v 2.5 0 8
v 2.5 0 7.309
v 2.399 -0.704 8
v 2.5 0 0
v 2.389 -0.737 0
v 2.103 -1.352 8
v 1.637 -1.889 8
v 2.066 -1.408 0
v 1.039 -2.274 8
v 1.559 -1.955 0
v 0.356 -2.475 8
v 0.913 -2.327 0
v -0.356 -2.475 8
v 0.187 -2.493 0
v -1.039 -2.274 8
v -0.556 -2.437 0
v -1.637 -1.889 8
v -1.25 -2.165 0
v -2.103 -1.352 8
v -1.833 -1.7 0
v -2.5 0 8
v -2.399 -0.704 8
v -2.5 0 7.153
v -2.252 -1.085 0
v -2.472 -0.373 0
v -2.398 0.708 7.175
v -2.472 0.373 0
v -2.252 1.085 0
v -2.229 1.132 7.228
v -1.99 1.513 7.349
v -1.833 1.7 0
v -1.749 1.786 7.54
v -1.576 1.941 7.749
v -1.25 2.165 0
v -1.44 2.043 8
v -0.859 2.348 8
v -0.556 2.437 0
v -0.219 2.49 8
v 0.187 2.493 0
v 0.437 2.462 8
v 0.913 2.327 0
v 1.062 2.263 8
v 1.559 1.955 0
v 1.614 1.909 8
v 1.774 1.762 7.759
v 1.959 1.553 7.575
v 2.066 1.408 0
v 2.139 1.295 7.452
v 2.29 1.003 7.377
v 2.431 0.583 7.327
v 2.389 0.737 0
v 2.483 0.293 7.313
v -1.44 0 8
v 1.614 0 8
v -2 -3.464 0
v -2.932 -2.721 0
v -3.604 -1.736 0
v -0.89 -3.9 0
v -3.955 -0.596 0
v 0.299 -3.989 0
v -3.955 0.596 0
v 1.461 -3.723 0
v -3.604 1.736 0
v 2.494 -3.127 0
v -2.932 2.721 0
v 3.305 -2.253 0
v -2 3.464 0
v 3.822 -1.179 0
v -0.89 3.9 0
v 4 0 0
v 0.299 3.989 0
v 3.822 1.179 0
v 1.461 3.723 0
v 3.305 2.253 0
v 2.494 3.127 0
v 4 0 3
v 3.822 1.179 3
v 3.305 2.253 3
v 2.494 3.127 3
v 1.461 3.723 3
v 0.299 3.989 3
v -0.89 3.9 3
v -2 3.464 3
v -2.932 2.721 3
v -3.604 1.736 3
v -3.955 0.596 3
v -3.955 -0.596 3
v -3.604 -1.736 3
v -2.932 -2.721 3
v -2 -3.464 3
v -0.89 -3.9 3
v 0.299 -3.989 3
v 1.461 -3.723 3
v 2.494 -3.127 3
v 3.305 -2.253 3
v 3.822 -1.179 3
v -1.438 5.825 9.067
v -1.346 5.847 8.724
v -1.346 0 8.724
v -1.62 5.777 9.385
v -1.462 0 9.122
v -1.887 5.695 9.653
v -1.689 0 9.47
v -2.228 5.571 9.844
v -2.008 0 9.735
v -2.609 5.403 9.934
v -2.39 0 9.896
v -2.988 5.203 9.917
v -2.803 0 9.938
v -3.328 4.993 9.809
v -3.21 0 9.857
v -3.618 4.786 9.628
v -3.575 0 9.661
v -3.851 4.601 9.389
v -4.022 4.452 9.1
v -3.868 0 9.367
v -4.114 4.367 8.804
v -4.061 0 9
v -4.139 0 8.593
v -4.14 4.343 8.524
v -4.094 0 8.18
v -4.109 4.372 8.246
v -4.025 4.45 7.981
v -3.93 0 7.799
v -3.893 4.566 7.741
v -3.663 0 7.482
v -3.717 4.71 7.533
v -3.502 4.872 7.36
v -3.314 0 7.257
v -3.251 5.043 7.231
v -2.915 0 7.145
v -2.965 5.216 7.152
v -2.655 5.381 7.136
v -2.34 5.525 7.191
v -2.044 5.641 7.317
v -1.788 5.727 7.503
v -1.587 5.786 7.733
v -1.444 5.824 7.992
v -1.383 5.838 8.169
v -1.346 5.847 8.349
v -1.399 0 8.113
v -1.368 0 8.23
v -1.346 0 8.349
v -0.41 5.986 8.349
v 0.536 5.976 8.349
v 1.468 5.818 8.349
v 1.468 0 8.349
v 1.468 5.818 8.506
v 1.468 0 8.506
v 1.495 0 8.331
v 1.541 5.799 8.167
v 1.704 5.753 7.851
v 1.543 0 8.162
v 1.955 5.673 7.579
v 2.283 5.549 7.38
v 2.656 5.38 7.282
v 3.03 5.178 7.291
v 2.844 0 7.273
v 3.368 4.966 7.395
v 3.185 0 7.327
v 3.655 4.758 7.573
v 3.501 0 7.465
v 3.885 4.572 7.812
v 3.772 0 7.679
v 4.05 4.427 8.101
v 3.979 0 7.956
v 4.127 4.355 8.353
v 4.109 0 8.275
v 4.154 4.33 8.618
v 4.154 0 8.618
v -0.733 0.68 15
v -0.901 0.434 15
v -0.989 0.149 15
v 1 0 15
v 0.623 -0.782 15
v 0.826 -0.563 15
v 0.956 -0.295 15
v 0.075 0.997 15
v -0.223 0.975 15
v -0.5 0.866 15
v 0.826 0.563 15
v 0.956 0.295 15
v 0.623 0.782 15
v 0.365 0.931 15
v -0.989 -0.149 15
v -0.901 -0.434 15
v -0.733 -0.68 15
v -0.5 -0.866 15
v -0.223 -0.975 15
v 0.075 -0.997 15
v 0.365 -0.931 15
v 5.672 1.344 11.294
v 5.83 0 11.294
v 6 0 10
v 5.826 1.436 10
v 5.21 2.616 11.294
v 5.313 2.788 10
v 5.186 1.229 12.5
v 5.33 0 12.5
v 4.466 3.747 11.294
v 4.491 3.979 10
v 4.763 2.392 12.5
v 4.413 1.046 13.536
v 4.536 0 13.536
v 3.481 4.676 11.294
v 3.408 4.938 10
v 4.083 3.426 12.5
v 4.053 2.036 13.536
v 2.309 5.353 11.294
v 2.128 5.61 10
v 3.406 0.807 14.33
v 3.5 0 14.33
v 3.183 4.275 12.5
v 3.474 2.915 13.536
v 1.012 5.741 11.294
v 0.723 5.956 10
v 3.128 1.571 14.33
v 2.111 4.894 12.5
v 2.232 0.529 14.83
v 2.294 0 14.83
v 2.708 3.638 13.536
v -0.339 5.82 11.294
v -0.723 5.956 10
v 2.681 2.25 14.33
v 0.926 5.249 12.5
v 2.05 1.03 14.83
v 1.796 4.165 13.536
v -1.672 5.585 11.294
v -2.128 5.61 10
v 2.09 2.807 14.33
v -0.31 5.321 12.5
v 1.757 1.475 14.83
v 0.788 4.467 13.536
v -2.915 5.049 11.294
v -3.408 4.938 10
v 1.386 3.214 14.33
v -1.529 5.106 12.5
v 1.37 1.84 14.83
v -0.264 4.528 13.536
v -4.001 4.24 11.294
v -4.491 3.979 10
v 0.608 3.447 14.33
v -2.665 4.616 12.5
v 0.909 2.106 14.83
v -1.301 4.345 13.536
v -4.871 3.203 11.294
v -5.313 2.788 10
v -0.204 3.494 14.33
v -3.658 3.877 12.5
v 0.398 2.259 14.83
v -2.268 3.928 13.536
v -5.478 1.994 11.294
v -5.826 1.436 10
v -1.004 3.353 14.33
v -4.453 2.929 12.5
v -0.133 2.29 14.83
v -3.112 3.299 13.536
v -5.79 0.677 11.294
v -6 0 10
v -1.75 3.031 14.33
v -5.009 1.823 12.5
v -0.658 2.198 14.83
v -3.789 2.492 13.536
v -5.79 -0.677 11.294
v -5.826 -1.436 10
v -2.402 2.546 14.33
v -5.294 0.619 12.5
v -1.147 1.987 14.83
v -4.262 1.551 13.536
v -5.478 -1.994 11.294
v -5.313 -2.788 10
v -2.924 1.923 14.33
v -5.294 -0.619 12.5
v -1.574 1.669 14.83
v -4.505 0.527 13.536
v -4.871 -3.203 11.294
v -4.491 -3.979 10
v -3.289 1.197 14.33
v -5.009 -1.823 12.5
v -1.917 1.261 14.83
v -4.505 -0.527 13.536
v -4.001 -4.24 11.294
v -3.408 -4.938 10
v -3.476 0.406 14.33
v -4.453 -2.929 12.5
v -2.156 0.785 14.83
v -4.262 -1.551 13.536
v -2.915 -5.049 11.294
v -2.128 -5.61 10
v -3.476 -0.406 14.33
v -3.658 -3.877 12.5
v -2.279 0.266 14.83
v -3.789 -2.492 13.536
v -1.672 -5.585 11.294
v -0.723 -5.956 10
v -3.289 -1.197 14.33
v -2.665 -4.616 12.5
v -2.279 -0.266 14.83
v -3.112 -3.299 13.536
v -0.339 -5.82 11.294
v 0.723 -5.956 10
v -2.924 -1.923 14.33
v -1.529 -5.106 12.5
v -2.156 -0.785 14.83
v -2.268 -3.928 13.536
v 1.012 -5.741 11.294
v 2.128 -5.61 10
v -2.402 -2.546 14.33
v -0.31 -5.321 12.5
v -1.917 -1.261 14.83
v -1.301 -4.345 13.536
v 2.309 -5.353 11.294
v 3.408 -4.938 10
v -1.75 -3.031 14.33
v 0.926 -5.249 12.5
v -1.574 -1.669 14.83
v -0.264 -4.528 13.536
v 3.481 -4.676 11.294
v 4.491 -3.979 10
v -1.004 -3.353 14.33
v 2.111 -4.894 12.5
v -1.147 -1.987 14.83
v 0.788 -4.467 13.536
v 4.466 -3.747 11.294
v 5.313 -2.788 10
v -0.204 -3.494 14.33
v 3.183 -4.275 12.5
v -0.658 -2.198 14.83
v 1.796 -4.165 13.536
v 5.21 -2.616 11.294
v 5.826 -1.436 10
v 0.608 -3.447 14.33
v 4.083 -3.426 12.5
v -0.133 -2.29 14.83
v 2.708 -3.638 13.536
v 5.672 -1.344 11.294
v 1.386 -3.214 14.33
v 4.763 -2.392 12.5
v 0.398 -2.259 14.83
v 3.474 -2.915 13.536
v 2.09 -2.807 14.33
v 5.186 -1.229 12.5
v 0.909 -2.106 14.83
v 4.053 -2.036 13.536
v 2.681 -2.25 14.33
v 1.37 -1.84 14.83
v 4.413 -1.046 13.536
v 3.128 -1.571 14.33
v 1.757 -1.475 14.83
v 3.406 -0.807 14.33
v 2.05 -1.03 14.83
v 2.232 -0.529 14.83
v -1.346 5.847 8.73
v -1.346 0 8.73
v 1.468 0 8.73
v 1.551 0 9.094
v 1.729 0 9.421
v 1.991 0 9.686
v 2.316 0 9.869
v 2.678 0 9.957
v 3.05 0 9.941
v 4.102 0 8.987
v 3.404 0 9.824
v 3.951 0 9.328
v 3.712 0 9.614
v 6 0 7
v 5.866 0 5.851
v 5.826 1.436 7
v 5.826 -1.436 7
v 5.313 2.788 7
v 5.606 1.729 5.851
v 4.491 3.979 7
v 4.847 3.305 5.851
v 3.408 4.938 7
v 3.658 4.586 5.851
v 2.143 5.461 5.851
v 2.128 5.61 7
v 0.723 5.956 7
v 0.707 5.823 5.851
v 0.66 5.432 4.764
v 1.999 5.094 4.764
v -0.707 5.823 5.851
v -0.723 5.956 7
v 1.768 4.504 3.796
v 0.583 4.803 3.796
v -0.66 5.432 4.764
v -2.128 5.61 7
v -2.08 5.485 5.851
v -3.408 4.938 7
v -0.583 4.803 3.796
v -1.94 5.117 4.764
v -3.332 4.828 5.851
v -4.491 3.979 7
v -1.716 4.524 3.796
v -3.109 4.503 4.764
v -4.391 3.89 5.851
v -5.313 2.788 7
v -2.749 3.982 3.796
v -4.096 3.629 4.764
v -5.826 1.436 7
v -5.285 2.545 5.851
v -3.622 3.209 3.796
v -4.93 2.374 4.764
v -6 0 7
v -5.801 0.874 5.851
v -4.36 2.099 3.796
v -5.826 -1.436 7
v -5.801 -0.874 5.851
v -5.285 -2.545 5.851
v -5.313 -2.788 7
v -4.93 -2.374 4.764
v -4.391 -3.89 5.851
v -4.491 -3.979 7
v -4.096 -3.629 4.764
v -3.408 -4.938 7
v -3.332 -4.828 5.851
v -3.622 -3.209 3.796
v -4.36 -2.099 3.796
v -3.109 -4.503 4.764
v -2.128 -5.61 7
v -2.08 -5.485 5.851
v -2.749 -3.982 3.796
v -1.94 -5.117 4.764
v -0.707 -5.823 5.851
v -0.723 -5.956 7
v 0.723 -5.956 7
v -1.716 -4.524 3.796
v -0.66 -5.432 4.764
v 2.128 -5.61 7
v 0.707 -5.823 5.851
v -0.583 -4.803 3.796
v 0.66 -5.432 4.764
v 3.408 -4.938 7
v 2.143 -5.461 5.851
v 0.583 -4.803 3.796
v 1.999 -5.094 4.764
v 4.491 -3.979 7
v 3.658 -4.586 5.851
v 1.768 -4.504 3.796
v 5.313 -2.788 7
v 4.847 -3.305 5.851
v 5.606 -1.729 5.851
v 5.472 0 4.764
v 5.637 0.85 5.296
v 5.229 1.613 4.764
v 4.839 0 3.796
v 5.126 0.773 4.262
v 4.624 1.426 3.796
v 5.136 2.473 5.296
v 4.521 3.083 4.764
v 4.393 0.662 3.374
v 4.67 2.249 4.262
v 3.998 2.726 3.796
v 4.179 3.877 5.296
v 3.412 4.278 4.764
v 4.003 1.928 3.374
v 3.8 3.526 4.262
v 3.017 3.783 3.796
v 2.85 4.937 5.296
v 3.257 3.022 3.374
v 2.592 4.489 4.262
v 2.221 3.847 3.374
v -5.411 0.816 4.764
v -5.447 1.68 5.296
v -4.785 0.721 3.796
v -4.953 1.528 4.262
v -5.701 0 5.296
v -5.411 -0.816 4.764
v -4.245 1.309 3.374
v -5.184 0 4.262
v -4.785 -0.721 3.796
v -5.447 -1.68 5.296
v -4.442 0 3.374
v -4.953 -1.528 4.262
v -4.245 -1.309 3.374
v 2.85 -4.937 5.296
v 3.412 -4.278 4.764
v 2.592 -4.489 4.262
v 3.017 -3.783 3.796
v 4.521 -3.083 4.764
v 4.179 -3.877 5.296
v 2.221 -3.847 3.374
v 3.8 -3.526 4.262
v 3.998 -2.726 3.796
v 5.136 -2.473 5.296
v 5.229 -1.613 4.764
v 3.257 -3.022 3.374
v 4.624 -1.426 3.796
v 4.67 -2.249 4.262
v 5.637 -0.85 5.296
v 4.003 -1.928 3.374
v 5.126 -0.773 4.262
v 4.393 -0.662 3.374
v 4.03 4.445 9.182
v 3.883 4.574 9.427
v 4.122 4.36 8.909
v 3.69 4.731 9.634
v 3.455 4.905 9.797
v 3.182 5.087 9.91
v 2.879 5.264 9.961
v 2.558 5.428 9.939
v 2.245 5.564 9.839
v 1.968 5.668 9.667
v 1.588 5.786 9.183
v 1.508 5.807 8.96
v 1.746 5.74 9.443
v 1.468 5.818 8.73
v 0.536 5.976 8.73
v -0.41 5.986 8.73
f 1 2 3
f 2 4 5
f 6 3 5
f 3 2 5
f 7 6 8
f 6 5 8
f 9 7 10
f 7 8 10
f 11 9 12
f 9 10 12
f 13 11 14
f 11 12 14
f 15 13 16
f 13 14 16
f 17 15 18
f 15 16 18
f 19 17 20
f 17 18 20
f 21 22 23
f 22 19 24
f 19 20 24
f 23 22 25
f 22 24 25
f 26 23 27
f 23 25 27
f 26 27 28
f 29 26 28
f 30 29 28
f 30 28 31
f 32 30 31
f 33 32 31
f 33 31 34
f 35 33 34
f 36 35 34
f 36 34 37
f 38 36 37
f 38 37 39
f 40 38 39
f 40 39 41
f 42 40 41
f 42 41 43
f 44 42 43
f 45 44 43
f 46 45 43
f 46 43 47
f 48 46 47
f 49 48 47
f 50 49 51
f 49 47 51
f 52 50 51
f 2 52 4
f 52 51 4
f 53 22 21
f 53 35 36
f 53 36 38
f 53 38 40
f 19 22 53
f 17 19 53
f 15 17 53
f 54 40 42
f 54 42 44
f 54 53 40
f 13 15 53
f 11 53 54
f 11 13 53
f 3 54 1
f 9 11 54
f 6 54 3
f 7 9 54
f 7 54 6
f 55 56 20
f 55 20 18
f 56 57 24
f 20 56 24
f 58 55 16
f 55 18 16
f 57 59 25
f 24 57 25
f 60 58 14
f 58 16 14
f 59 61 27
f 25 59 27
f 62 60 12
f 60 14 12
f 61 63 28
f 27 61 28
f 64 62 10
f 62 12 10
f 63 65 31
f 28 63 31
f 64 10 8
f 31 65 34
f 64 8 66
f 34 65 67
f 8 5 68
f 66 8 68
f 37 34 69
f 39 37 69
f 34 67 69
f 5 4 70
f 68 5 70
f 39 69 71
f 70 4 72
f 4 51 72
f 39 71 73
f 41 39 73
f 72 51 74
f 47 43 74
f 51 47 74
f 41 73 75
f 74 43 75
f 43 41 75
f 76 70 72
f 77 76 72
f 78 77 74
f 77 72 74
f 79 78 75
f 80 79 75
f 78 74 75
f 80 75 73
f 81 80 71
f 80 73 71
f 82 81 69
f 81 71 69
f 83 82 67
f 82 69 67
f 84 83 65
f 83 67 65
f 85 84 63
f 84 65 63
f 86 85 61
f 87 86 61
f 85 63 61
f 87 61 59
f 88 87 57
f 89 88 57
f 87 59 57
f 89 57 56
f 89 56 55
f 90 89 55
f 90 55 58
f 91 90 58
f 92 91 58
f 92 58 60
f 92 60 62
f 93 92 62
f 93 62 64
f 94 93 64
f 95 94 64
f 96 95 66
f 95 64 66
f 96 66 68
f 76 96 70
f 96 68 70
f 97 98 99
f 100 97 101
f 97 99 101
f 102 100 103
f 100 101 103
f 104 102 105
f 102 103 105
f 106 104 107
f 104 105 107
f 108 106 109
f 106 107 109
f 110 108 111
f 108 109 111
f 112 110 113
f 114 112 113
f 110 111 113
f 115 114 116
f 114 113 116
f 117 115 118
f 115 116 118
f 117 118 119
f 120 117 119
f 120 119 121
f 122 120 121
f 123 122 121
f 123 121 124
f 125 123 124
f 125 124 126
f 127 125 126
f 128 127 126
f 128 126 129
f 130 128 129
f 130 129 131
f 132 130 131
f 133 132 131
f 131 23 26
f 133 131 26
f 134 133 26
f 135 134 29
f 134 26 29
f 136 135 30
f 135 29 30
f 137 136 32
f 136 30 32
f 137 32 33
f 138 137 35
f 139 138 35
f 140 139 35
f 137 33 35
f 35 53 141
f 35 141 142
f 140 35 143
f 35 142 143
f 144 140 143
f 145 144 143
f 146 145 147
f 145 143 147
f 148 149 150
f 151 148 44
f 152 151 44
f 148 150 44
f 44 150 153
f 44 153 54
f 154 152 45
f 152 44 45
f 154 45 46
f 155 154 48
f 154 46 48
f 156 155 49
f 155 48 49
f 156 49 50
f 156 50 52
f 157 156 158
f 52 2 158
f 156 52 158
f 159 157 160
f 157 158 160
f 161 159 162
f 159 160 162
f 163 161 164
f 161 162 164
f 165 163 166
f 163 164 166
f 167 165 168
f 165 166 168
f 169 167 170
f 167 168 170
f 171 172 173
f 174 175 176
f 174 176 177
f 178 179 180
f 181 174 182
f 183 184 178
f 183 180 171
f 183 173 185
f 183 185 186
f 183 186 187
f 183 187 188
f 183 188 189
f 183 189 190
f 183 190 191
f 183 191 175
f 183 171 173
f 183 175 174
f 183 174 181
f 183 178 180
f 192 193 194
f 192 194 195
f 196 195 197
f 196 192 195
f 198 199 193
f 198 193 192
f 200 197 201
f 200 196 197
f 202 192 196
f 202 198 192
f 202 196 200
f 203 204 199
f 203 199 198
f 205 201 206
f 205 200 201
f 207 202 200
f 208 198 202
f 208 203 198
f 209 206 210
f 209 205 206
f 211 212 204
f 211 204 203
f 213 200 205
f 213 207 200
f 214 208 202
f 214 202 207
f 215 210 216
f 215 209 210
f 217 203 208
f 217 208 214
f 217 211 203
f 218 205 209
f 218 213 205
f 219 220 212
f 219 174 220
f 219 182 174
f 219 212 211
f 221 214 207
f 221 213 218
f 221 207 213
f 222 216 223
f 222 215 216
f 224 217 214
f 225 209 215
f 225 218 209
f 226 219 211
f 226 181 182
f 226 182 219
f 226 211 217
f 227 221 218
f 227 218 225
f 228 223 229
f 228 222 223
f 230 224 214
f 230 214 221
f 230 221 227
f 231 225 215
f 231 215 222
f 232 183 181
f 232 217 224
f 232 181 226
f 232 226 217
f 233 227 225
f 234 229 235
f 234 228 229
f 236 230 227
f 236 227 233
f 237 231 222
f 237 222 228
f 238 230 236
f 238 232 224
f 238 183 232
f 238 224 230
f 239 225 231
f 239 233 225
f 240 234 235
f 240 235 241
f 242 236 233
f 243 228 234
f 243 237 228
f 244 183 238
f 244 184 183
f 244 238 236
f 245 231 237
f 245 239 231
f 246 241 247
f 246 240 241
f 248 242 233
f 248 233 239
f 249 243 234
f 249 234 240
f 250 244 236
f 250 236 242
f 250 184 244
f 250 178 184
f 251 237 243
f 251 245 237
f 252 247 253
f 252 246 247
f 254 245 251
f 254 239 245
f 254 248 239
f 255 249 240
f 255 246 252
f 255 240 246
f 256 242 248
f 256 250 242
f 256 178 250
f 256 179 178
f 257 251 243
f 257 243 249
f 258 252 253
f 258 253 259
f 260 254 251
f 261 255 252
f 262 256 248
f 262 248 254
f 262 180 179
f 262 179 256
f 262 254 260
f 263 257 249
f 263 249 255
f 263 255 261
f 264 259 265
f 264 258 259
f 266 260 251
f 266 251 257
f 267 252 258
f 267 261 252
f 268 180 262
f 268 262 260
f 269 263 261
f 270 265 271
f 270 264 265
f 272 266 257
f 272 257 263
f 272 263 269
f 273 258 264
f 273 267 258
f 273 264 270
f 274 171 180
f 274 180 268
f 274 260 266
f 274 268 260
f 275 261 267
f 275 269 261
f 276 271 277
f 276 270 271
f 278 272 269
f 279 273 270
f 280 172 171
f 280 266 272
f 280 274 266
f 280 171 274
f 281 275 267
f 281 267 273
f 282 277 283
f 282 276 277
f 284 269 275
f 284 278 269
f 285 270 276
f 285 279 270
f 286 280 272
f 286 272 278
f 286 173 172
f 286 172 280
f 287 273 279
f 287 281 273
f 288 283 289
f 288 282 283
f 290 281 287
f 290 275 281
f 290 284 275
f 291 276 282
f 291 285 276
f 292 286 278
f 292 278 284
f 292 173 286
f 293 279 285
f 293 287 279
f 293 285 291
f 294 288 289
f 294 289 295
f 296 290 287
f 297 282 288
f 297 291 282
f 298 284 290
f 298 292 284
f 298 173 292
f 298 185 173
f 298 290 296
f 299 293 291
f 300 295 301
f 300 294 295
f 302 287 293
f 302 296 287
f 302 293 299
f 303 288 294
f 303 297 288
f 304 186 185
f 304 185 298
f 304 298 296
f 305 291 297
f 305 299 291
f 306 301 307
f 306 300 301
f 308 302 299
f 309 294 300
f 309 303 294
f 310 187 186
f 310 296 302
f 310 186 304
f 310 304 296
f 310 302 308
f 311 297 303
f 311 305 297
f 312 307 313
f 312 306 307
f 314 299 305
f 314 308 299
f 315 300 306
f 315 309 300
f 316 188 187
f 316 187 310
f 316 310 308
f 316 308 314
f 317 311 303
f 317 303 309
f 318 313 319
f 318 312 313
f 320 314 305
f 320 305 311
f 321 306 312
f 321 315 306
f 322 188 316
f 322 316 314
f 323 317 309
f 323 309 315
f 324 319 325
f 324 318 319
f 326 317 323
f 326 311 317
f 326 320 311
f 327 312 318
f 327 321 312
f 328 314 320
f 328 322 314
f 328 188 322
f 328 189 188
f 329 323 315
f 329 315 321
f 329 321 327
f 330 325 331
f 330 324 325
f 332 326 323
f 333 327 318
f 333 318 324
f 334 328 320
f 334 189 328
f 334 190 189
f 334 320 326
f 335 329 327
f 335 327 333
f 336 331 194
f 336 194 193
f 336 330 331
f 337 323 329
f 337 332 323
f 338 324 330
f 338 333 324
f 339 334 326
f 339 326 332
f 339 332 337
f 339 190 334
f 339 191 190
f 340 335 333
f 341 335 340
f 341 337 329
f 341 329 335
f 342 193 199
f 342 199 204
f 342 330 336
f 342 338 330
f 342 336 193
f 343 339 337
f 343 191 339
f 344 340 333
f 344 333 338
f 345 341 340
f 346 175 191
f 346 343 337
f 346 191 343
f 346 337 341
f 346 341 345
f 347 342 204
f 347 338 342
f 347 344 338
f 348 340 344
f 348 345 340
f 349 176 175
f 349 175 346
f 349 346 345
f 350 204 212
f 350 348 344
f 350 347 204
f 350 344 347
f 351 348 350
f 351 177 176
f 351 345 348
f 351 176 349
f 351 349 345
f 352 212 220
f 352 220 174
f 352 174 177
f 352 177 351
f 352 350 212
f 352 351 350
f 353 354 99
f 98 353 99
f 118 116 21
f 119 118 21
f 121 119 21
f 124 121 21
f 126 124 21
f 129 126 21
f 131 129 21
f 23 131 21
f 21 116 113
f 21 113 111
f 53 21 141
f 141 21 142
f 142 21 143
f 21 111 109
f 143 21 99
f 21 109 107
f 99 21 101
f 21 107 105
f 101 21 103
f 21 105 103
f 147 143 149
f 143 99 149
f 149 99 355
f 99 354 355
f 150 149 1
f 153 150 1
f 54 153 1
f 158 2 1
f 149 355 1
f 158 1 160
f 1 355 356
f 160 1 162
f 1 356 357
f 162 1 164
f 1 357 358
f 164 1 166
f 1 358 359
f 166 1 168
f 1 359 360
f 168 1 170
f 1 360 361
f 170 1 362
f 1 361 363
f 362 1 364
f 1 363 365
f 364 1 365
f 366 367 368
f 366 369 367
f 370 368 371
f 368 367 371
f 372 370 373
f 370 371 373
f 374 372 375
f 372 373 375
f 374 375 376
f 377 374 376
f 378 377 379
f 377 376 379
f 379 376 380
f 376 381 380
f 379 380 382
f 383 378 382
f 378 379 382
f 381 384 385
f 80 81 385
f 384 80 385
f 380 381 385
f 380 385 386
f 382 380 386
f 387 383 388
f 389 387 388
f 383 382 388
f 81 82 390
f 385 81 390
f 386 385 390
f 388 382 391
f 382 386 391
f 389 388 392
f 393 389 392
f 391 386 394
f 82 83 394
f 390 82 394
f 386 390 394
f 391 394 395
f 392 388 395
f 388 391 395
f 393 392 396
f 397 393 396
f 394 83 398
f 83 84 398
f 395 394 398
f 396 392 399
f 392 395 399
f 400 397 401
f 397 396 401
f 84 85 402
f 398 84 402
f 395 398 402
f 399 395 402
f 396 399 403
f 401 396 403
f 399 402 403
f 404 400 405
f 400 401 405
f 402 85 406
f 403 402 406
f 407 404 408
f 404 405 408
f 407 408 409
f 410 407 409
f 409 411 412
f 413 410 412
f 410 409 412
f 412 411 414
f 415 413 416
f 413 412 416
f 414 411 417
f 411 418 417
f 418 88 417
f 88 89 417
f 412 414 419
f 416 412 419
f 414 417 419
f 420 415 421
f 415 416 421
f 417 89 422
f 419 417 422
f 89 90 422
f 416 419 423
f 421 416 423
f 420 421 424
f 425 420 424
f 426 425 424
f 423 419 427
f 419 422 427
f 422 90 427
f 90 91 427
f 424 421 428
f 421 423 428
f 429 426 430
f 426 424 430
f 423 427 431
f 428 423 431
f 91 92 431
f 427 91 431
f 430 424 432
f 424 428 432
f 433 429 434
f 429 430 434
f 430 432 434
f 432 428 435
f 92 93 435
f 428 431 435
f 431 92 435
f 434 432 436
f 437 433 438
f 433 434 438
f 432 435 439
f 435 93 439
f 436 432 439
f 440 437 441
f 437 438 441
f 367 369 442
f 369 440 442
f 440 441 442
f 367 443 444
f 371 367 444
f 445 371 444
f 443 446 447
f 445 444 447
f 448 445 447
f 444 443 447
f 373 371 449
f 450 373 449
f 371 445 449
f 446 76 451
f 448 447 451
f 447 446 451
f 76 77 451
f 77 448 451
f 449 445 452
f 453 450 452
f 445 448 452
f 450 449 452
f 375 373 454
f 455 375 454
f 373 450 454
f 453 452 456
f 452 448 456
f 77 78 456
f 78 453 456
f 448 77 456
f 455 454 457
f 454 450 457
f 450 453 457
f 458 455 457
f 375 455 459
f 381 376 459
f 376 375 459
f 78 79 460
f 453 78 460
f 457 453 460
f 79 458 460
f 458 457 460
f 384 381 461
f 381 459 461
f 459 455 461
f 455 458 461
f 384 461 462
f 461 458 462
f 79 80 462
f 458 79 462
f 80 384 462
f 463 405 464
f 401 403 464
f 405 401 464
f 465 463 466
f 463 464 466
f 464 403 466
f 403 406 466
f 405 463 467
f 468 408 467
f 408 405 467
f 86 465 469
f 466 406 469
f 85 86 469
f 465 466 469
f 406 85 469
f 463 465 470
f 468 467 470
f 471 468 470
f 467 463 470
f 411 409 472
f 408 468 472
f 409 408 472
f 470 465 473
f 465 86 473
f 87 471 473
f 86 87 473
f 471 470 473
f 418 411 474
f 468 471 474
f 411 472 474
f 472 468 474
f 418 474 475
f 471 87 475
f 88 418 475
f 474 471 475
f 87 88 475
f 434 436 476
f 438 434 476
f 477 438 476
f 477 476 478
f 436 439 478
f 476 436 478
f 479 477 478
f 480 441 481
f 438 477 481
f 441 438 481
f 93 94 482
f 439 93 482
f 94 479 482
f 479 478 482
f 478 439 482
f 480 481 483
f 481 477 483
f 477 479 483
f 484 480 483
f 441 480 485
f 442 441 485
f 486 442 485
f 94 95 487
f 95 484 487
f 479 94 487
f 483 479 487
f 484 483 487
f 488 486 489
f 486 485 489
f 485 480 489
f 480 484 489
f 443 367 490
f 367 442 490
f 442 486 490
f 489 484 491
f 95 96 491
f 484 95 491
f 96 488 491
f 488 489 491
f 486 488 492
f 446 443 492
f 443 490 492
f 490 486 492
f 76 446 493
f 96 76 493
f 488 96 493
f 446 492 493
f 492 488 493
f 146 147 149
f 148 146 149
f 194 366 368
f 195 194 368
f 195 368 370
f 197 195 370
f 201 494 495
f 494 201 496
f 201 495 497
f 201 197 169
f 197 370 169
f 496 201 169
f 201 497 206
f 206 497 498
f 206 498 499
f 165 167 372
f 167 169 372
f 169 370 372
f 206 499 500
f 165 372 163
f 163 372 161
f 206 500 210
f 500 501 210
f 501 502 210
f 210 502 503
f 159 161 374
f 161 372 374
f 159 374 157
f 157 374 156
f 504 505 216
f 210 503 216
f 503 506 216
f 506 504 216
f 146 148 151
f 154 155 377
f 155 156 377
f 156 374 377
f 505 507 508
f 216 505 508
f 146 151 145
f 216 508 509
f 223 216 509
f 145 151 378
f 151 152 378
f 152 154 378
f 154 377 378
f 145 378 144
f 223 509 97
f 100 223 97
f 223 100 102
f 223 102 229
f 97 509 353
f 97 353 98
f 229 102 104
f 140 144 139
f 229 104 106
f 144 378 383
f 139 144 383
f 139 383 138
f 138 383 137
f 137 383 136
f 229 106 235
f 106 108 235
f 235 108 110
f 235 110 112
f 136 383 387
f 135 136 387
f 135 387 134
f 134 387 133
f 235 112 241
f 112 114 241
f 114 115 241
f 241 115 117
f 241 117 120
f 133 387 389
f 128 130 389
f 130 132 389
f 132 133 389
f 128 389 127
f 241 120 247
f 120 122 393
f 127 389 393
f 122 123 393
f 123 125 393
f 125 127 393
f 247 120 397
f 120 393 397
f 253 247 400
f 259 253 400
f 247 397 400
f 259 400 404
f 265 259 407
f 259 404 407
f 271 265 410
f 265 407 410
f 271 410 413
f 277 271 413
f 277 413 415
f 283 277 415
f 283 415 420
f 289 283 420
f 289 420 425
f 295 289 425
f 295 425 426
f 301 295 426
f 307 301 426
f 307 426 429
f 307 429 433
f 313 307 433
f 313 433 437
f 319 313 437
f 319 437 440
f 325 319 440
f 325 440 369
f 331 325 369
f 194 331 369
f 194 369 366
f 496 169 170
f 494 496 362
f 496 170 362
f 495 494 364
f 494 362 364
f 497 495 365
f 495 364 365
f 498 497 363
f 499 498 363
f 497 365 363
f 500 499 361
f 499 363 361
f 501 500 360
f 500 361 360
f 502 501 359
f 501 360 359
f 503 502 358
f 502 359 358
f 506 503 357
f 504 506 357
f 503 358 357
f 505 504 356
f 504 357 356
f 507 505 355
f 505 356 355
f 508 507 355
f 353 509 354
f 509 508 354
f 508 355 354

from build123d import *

# Parameters (mm, degrees)
F0_R     = 4
F1_DEPTH = 3
F2_R     = 6
F3_DEPTH = 12
F4_R     = 5
F6_R     = 2.5
F7_DEPTH = 8
F9_DEPTH = 8


# Not quite as in the source:
# - a fillet or chamfer that OpenCascade refuses, or shapes differently, is made with other operations: its cross-section is extruded or revolved along the edge and cut away or added


with BuildPart() as f1:
    # F0 (on Top) → F1 (new body)
    with BuildSketch(Plane.XY):
        Circle(F0_R)
    extrude(amount=F1_DEPTH)

    # F2 (on face) → F3 (join)
    with BuildSketch(Plane.XY.offset(3)):
        Circle(F2_R)
    extrude(amount=F3_DEPTH)

    # F4
    f4_edges = [f1.edges().sort_by_distance(p)[0] for p in [
        (-6, 0, 15),
    ]]
    fillet(f4_edges, radius=F4_R)

    # F5: fillet of radius 5 on 1 edges, made by hand

    # F5_s1 → F5_t2 (revolve, cut)
    with BuildSketch(Plane.XZ):
        with BuildLine():
            ThreePointArc((6, 7), (5.472135955, 4.7639320225), (4, 3))
            Line((4, 3), (6, 3))
            Line((6, 3), (6, 7))
        make_face()
    revolve(axis=Axis((0, 0, 3), (0, 0, 1)), mode=Mode.SUBTRACT)

    # F6 (on face) → F7 (cut)
    with BuildSketch(Plane(origin=(0, 0, 0), x_dir=(1, 0, 0), z_dir=(0, 0, -1))):
        Circle(F6_R)
    extrude(amount=-F7_DEPTH, mode=Mode.SUBTRACT)

    # F8 (on Front) → F9 (cut)
    with BuildSketch(Plane.XZ):
        with BuildLine():
            Line((-1.3463870705, 8.7240217328), (-1.3463870705, 8.3487899899))
            ThreePointArc((-1.3463870705, 8.3487899899), (-1.3369403935, 8.4423866045), (-1.3337867757, 8.5364058614))
            ThreePointArc((-1.3337867757, 8.5364058614), (-1.3369403935, 8.6304251183), (-1.3463870705, 8.7240217328))
        make_face()
        with BuildLine():
            ThreePointArc((-1.3337867757, 8.5364058614), (-1.3369403935, 8.4423866045), (-1.3463870705, 8.3487899899))
            Line((-1.3463870705, 8.3487899899), (1.4683810595, 8.3487899899))
            Line((1.4683810595, 8.3487899899), (1.4683810595, 8.5058610392))
            ThreePointArc((1.4683810595, 8.5058610392), (1.4637016301, 8.6179580539), (1.4683810595, 8.7300550686))
            Line((1.4683810595, 8.7300550686), (-1.3463870705, 8.7300550686))
            Line((-1.3463870705, 8.7300550686), (-1.3463870705, 8.7240217328))
            ThreePointArc((-1.3463870705, 8.7240217328), (-1.3369403935, 8.6304251183), (-1.3337867757, 8.5364058614))
        make_face()
        with BuildLine():
            ThreePointArc((-1.3463870705, 8.7240217328), (-4.1399498979, 8.5364058614), (-1.3463870705, 8.3487899899))
            Line((-1.3463870705, 8.3487899899), (-1.3463870705, 8.7240217328))
        make_face()
        with BuildLine():
            Line((1.4683810595, 8.7300550686), (1.4683810595, 8.5058610392))
            ThreePointArc((1.4683810595, 8.5058610392), (2.864796007, 7.2741313647), (4.1536957416, 8.6179580539))
            ThreePointArc((4.1536957416, 8.6179580539), (2.864796007, 9.9617847432), (1.4683810595, 8.7300550686))
        make_face()
        with BuildLine():
            ThreePointArc((1.4683810595, 8.7300550686), (1.4637016301, 8.6179580539), (1.4683810595, 8.5058610392))
            Line((1.4683810595, 8.5058610392), (1.4683810595, 8.7300550686))
        make_face()
    extrude(amount=-F9_DEPTH, mode=Mode.SUBTRACT)


solid = f1.part
